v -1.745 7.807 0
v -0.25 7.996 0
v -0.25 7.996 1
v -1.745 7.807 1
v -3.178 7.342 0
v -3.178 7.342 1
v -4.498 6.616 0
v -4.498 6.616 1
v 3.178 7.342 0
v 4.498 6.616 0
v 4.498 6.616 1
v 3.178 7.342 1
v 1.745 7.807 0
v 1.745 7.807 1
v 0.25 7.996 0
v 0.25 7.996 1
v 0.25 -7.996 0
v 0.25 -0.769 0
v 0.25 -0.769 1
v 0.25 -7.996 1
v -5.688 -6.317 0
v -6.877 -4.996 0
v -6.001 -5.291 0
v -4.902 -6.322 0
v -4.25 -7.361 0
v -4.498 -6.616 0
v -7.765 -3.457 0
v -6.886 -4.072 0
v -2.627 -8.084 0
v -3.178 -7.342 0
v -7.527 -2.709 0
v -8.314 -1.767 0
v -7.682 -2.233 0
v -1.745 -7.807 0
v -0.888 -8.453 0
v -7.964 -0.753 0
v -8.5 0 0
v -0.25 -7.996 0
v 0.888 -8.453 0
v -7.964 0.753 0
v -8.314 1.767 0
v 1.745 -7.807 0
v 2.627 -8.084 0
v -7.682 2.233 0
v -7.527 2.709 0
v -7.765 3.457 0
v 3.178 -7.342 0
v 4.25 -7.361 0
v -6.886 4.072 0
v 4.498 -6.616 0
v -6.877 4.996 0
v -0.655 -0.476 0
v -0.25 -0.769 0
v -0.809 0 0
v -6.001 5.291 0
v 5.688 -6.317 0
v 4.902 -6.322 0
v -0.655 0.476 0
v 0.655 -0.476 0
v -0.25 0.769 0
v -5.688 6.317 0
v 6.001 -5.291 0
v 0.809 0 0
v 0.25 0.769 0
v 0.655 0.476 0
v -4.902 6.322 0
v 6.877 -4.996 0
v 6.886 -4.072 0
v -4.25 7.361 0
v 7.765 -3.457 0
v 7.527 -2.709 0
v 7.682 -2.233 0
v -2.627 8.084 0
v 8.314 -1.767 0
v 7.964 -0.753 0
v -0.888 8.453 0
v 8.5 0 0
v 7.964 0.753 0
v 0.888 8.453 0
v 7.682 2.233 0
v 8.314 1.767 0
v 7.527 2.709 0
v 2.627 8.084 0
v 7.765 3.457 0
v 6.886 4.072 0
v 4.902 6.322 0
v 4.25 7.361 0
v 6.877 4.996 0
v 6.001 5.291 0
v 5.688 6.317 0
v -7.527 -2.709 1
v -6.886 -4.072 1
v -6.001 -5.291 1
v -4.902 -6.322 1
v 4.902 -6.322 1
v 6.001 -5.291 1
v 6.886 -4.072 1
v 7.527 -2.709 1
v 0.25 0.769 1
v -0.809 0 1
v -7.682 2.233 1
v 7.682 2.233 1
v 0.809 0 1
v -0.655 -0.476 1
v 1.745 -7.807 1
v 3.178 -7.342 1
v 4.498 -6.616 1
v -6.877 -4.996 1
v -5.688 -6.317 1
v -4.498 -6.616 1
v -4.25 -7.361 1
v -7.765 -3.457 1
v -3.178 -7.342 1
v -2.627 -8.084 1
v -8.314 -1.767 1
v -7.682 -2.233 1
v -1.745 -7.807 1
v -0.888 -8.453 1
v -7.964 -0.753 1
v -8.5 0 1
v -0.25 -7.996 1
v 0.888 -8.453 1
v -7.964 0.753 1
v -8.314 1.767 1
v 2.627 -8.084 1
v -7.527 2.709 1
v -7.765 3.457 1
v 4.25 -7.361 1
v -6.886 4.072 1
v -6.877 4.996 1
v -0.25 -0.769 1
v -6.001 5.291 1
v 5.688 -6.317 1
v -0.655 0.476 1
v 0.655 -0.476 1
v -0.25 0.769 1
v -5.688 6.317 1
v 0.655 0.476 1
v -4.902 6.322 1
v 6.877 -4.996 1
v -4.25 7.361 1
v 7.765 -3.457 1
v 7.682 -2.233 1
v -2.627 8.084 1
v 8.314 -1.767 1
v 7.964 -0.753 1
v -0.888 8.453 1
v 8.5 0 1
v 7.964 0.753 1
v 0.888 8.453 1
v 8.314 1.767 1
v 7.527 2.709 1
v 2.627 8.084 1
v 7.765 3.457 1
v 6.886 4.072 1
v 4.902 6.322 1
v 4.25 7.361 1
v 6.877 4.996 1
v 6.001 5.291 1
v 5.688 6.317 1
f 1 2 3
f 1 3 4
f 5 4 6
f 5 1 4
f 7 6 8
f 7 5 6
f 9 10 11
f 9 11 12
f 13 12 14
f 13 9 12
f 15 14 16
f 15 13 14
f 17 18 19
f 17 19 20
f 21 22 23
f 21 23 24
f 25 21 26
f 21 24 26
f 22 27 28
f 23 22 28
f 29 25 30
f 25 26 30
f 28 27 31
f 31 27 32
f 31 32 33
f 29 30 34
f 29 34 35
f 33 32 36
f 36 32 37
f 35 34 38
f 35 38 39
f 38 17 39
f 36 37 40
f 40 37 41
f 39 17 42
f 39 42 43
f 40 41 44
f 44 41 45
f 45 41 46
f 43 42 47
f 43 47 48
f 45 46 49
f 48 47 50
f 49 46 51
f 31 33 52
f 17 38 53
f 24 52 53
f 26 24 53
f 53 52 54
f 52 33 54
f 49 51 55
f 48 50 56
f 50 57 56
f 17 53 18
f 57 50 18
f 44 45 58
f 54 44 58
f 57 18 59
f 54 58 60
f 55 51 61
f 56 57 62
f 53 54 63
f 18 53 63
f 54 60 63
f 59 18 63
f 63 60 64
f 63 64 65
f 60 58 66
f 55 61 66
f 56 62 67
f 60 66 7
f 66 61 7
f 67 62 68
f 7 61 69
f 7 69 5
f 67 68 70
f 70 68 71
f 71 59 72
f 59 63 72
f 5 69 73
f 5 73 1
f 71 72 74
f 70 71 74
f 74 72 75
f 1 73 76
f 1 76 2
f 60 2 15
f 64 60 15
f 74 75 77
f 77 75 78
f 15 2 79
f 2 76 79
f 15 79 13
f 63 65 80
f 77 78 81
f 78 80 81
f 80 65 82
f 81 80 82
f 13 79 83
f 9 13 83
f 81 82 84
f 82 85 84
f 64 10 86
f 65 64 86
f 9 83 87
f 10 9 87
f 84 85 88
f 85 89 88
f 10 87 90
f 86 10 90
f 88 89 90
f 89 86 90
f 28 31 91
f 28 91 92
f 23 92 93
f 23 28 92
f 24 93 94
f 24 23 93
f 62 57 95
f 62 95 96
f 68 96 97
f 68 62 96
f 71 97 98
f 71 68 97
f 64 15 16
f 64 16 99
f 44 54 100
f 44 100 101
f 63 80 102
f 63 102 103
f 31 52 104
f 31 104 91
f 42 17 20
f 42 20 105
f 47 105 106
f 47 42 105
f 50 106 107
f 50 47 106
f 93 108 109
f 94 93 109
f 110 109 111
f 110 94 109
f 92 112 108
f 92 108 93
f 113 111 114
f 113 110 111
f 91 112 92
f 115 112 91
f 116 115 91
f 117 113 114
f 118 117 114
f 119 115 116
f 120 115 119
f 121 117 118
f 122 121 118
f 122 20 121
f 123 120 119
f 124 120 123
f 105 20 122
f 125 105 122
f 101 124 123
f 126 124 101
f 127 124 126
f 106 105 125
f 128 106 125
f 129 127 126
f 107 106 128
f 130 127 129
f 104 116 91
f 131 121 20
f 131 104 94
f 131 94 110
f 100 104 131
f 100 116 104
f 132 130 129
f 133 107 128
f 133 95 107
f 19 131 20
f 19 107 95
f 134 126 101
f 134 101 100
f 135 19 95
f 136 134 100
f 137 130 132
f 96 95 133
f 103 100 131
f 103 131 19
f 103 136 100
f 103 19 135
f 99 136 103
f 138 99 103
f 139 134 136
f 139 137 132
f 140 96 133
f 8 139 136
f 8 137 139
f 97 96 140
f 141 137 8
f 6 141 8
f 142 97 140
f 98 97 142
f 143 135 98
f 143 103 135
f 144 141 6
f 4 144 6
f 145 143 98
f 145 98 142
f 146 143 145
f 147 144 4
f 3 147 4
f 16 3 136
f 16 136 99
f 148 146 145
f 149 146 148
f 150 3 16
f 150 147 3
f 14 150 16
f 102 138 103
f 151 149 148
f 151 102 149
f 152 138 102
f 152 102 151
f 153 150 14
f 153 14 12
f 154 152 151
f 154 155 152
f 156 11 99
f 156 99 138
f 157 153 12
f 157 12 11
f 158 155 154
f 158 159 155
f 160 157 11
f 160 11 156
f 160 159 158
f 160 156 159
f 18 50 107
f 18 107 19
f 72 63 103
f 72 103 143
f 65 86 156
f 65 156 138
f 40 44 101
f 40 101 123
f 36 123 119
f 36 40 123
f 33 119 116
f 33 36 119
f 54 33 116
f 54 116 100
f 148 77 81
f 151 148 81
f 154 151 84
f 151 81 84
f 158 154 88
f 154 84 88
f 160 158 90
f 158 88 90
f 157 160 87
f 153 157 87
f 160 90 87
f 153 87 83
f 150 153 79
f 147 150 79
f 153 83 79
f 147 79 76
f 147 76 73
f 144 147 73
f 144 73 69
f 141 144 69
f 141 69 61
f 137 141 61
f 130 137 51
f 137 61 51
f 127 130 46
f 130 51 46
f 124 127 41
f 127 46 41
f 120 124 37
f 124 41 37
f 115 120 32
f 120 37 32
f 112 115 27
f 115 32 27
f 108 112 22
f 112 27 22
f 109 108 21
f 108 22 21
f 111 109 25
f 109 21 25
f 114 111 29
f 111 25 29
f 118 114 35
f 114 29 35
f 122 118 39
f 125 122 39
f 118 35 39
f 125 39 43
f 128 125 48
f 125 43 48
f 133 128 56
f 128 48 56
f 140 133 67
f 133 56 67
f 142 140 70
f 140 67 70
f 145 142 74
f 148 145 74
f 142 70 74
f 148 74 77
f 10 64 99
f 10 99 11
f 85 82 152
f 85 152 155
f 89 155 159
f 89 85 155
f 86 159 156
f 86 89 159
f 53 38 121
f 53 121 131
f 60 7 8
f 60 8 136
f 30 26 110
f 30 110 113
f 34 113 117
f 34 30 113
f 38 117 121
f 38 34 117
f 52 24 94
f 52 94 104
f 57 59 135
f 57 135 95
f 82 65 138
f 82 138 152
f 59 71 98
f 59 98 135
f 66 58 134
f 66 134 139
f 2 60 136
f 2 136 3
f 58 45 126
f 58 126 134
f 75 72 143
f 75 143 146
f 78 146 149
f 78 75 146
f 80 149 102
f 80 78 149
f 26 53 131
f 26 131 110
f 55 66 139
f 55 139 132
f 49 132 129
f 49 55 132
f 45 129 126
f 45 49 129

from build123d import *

# Parameters (mm, degrees)
ESBO_O1_R                = 8.5
RESSALTO_EXTRUS_O1_DEPTH = 1


with BuildPart() as part:
    # Esboço1 → Ressalto-extrusão1 (new body)
    with BuildSketch(Plane.XY):
        Circle(ESBO_O1_R)
        with BuildLine():
            Line((-0.654508497, 0.475528258), (-4.90223967, 6.322028647))
            ThreePointArc((-4.90223967, 6.322028647), (-6.472135955, 4.702282018), (-7.52748191, 2.708692692))
            Line((-7.52748191, 2.708692692), (-0.654508497, 0.475528258))
        make_face(mode=Mode.SUBTRACT)
        with BuildLine():
            Line((-0.25, 0.769420884), (-0.25, 7.996092796))
            ThreePointArc((-0.25, 7.996092796), (-2.472135955, 7.60845213), (-4.497731173, 6.615921274))
            Line((-4.497731173, 6.615921274), (-0.25, 0.769420884))
        make_face(mode=Mode.SUBTRACT)
        with BuildLine():
            Line((0.25, 0.769420884), (4.497731173, 6.615921274))
            ThreePointArc((4.497731173, 6.615921274), (2.472135955, 7.60845213), (0.25, 7.996092796))
            Line((0.25, 7.996092796), (0.25, 0.769420884))
        make_face(mode=Mode.SUBTRACT)
        with BuildLine():
            Line((0.654508497, 0.475528258), (7.52748191, 2.708692692))
            ThreePointArc((7.52748191, 2.708692692), (6.472135955, 4.702282018), (4.90223967, 6.322028647))
            Line((4.90223967, 6.322028647), (0.654508497, 0.475528258))
        make_face(mode=Mode.SUBTRACT)
        with BuildLine():
            Line((0.809016994, 0), (7.681990407, -2.233164433))
            ThreePointArc((7.681990407, -2.233164433), (8, 0), (7.681990407, 2.233164433))
            Line((7.681990407, 2.233164433), (0.809016994, 0))
        make_face(mode=Mode.SUBTRACT)
        with BuildLine():
            Line((0.654508497, -0.475528258), (4.90223967, -6.322028647))
            ThreePointArc((4.90223967, -6.322028647), (6.472135955, -4.702282018), (7.52748191, -2.708692692))
            Line((7.52748191, -2.708692692), (0.654508497, -0.475528258))
        make_face(mode=Mode.SUBTRACT)
        with BuildLine():
            Line((0.25, -0.769420884), (0.25, -7.996092796))
            ThreePointArc((0.25, -7.996092796), (2.472135955, -7.60845213), (4.497731173, -6.615921274))
            Line((4.497731173, -6.615921274), (0.25, -0.769420884))
        make_face(mode=Mode.SUBTRACT)
        with BuildLine():
            Line((-0.25, -0.769420884), (-4.497731173, -6.615921274))
            ThreePointArc((-4.497731173, -6.615921274), (-2.472135955, -7.60845213), (-0.25, -7.996092796))
            Line((-0.25, -7.996092796), (-0.25, -0.769420884))
        make_face(mode=Mode.SUBTRACT)
        with BuildLine():
            Line((-0.654508497, -0.475528258), (-7.52748191, -2.708692692))
            ThreePointArc((-7.52748191, -2.708692692), (-6.472135955, -4.702282018), (-4.90223967, -6.322028647))
            Line((-4.90223967, -6.322028647), (-0.654508497, -0.475528258))
        make_face(mode=Mode.SUBTRACT)
        with BuildLine():
            Line((-0.809016994, 0), (-7.681990407, 2.233164433))
            ThreePointArc((-7.681990407, 2.233164433), (-8, 0), (-7.681990407, -2.233164433))
            Line((-7.681990407, -2.233164433), (-0.809016994, 0))
        make_face(mode=Mode.SUBTRACT)
    extrude(amount=RESSALTO_EXTRUS_O1_DEPTH)


solid = part.part
